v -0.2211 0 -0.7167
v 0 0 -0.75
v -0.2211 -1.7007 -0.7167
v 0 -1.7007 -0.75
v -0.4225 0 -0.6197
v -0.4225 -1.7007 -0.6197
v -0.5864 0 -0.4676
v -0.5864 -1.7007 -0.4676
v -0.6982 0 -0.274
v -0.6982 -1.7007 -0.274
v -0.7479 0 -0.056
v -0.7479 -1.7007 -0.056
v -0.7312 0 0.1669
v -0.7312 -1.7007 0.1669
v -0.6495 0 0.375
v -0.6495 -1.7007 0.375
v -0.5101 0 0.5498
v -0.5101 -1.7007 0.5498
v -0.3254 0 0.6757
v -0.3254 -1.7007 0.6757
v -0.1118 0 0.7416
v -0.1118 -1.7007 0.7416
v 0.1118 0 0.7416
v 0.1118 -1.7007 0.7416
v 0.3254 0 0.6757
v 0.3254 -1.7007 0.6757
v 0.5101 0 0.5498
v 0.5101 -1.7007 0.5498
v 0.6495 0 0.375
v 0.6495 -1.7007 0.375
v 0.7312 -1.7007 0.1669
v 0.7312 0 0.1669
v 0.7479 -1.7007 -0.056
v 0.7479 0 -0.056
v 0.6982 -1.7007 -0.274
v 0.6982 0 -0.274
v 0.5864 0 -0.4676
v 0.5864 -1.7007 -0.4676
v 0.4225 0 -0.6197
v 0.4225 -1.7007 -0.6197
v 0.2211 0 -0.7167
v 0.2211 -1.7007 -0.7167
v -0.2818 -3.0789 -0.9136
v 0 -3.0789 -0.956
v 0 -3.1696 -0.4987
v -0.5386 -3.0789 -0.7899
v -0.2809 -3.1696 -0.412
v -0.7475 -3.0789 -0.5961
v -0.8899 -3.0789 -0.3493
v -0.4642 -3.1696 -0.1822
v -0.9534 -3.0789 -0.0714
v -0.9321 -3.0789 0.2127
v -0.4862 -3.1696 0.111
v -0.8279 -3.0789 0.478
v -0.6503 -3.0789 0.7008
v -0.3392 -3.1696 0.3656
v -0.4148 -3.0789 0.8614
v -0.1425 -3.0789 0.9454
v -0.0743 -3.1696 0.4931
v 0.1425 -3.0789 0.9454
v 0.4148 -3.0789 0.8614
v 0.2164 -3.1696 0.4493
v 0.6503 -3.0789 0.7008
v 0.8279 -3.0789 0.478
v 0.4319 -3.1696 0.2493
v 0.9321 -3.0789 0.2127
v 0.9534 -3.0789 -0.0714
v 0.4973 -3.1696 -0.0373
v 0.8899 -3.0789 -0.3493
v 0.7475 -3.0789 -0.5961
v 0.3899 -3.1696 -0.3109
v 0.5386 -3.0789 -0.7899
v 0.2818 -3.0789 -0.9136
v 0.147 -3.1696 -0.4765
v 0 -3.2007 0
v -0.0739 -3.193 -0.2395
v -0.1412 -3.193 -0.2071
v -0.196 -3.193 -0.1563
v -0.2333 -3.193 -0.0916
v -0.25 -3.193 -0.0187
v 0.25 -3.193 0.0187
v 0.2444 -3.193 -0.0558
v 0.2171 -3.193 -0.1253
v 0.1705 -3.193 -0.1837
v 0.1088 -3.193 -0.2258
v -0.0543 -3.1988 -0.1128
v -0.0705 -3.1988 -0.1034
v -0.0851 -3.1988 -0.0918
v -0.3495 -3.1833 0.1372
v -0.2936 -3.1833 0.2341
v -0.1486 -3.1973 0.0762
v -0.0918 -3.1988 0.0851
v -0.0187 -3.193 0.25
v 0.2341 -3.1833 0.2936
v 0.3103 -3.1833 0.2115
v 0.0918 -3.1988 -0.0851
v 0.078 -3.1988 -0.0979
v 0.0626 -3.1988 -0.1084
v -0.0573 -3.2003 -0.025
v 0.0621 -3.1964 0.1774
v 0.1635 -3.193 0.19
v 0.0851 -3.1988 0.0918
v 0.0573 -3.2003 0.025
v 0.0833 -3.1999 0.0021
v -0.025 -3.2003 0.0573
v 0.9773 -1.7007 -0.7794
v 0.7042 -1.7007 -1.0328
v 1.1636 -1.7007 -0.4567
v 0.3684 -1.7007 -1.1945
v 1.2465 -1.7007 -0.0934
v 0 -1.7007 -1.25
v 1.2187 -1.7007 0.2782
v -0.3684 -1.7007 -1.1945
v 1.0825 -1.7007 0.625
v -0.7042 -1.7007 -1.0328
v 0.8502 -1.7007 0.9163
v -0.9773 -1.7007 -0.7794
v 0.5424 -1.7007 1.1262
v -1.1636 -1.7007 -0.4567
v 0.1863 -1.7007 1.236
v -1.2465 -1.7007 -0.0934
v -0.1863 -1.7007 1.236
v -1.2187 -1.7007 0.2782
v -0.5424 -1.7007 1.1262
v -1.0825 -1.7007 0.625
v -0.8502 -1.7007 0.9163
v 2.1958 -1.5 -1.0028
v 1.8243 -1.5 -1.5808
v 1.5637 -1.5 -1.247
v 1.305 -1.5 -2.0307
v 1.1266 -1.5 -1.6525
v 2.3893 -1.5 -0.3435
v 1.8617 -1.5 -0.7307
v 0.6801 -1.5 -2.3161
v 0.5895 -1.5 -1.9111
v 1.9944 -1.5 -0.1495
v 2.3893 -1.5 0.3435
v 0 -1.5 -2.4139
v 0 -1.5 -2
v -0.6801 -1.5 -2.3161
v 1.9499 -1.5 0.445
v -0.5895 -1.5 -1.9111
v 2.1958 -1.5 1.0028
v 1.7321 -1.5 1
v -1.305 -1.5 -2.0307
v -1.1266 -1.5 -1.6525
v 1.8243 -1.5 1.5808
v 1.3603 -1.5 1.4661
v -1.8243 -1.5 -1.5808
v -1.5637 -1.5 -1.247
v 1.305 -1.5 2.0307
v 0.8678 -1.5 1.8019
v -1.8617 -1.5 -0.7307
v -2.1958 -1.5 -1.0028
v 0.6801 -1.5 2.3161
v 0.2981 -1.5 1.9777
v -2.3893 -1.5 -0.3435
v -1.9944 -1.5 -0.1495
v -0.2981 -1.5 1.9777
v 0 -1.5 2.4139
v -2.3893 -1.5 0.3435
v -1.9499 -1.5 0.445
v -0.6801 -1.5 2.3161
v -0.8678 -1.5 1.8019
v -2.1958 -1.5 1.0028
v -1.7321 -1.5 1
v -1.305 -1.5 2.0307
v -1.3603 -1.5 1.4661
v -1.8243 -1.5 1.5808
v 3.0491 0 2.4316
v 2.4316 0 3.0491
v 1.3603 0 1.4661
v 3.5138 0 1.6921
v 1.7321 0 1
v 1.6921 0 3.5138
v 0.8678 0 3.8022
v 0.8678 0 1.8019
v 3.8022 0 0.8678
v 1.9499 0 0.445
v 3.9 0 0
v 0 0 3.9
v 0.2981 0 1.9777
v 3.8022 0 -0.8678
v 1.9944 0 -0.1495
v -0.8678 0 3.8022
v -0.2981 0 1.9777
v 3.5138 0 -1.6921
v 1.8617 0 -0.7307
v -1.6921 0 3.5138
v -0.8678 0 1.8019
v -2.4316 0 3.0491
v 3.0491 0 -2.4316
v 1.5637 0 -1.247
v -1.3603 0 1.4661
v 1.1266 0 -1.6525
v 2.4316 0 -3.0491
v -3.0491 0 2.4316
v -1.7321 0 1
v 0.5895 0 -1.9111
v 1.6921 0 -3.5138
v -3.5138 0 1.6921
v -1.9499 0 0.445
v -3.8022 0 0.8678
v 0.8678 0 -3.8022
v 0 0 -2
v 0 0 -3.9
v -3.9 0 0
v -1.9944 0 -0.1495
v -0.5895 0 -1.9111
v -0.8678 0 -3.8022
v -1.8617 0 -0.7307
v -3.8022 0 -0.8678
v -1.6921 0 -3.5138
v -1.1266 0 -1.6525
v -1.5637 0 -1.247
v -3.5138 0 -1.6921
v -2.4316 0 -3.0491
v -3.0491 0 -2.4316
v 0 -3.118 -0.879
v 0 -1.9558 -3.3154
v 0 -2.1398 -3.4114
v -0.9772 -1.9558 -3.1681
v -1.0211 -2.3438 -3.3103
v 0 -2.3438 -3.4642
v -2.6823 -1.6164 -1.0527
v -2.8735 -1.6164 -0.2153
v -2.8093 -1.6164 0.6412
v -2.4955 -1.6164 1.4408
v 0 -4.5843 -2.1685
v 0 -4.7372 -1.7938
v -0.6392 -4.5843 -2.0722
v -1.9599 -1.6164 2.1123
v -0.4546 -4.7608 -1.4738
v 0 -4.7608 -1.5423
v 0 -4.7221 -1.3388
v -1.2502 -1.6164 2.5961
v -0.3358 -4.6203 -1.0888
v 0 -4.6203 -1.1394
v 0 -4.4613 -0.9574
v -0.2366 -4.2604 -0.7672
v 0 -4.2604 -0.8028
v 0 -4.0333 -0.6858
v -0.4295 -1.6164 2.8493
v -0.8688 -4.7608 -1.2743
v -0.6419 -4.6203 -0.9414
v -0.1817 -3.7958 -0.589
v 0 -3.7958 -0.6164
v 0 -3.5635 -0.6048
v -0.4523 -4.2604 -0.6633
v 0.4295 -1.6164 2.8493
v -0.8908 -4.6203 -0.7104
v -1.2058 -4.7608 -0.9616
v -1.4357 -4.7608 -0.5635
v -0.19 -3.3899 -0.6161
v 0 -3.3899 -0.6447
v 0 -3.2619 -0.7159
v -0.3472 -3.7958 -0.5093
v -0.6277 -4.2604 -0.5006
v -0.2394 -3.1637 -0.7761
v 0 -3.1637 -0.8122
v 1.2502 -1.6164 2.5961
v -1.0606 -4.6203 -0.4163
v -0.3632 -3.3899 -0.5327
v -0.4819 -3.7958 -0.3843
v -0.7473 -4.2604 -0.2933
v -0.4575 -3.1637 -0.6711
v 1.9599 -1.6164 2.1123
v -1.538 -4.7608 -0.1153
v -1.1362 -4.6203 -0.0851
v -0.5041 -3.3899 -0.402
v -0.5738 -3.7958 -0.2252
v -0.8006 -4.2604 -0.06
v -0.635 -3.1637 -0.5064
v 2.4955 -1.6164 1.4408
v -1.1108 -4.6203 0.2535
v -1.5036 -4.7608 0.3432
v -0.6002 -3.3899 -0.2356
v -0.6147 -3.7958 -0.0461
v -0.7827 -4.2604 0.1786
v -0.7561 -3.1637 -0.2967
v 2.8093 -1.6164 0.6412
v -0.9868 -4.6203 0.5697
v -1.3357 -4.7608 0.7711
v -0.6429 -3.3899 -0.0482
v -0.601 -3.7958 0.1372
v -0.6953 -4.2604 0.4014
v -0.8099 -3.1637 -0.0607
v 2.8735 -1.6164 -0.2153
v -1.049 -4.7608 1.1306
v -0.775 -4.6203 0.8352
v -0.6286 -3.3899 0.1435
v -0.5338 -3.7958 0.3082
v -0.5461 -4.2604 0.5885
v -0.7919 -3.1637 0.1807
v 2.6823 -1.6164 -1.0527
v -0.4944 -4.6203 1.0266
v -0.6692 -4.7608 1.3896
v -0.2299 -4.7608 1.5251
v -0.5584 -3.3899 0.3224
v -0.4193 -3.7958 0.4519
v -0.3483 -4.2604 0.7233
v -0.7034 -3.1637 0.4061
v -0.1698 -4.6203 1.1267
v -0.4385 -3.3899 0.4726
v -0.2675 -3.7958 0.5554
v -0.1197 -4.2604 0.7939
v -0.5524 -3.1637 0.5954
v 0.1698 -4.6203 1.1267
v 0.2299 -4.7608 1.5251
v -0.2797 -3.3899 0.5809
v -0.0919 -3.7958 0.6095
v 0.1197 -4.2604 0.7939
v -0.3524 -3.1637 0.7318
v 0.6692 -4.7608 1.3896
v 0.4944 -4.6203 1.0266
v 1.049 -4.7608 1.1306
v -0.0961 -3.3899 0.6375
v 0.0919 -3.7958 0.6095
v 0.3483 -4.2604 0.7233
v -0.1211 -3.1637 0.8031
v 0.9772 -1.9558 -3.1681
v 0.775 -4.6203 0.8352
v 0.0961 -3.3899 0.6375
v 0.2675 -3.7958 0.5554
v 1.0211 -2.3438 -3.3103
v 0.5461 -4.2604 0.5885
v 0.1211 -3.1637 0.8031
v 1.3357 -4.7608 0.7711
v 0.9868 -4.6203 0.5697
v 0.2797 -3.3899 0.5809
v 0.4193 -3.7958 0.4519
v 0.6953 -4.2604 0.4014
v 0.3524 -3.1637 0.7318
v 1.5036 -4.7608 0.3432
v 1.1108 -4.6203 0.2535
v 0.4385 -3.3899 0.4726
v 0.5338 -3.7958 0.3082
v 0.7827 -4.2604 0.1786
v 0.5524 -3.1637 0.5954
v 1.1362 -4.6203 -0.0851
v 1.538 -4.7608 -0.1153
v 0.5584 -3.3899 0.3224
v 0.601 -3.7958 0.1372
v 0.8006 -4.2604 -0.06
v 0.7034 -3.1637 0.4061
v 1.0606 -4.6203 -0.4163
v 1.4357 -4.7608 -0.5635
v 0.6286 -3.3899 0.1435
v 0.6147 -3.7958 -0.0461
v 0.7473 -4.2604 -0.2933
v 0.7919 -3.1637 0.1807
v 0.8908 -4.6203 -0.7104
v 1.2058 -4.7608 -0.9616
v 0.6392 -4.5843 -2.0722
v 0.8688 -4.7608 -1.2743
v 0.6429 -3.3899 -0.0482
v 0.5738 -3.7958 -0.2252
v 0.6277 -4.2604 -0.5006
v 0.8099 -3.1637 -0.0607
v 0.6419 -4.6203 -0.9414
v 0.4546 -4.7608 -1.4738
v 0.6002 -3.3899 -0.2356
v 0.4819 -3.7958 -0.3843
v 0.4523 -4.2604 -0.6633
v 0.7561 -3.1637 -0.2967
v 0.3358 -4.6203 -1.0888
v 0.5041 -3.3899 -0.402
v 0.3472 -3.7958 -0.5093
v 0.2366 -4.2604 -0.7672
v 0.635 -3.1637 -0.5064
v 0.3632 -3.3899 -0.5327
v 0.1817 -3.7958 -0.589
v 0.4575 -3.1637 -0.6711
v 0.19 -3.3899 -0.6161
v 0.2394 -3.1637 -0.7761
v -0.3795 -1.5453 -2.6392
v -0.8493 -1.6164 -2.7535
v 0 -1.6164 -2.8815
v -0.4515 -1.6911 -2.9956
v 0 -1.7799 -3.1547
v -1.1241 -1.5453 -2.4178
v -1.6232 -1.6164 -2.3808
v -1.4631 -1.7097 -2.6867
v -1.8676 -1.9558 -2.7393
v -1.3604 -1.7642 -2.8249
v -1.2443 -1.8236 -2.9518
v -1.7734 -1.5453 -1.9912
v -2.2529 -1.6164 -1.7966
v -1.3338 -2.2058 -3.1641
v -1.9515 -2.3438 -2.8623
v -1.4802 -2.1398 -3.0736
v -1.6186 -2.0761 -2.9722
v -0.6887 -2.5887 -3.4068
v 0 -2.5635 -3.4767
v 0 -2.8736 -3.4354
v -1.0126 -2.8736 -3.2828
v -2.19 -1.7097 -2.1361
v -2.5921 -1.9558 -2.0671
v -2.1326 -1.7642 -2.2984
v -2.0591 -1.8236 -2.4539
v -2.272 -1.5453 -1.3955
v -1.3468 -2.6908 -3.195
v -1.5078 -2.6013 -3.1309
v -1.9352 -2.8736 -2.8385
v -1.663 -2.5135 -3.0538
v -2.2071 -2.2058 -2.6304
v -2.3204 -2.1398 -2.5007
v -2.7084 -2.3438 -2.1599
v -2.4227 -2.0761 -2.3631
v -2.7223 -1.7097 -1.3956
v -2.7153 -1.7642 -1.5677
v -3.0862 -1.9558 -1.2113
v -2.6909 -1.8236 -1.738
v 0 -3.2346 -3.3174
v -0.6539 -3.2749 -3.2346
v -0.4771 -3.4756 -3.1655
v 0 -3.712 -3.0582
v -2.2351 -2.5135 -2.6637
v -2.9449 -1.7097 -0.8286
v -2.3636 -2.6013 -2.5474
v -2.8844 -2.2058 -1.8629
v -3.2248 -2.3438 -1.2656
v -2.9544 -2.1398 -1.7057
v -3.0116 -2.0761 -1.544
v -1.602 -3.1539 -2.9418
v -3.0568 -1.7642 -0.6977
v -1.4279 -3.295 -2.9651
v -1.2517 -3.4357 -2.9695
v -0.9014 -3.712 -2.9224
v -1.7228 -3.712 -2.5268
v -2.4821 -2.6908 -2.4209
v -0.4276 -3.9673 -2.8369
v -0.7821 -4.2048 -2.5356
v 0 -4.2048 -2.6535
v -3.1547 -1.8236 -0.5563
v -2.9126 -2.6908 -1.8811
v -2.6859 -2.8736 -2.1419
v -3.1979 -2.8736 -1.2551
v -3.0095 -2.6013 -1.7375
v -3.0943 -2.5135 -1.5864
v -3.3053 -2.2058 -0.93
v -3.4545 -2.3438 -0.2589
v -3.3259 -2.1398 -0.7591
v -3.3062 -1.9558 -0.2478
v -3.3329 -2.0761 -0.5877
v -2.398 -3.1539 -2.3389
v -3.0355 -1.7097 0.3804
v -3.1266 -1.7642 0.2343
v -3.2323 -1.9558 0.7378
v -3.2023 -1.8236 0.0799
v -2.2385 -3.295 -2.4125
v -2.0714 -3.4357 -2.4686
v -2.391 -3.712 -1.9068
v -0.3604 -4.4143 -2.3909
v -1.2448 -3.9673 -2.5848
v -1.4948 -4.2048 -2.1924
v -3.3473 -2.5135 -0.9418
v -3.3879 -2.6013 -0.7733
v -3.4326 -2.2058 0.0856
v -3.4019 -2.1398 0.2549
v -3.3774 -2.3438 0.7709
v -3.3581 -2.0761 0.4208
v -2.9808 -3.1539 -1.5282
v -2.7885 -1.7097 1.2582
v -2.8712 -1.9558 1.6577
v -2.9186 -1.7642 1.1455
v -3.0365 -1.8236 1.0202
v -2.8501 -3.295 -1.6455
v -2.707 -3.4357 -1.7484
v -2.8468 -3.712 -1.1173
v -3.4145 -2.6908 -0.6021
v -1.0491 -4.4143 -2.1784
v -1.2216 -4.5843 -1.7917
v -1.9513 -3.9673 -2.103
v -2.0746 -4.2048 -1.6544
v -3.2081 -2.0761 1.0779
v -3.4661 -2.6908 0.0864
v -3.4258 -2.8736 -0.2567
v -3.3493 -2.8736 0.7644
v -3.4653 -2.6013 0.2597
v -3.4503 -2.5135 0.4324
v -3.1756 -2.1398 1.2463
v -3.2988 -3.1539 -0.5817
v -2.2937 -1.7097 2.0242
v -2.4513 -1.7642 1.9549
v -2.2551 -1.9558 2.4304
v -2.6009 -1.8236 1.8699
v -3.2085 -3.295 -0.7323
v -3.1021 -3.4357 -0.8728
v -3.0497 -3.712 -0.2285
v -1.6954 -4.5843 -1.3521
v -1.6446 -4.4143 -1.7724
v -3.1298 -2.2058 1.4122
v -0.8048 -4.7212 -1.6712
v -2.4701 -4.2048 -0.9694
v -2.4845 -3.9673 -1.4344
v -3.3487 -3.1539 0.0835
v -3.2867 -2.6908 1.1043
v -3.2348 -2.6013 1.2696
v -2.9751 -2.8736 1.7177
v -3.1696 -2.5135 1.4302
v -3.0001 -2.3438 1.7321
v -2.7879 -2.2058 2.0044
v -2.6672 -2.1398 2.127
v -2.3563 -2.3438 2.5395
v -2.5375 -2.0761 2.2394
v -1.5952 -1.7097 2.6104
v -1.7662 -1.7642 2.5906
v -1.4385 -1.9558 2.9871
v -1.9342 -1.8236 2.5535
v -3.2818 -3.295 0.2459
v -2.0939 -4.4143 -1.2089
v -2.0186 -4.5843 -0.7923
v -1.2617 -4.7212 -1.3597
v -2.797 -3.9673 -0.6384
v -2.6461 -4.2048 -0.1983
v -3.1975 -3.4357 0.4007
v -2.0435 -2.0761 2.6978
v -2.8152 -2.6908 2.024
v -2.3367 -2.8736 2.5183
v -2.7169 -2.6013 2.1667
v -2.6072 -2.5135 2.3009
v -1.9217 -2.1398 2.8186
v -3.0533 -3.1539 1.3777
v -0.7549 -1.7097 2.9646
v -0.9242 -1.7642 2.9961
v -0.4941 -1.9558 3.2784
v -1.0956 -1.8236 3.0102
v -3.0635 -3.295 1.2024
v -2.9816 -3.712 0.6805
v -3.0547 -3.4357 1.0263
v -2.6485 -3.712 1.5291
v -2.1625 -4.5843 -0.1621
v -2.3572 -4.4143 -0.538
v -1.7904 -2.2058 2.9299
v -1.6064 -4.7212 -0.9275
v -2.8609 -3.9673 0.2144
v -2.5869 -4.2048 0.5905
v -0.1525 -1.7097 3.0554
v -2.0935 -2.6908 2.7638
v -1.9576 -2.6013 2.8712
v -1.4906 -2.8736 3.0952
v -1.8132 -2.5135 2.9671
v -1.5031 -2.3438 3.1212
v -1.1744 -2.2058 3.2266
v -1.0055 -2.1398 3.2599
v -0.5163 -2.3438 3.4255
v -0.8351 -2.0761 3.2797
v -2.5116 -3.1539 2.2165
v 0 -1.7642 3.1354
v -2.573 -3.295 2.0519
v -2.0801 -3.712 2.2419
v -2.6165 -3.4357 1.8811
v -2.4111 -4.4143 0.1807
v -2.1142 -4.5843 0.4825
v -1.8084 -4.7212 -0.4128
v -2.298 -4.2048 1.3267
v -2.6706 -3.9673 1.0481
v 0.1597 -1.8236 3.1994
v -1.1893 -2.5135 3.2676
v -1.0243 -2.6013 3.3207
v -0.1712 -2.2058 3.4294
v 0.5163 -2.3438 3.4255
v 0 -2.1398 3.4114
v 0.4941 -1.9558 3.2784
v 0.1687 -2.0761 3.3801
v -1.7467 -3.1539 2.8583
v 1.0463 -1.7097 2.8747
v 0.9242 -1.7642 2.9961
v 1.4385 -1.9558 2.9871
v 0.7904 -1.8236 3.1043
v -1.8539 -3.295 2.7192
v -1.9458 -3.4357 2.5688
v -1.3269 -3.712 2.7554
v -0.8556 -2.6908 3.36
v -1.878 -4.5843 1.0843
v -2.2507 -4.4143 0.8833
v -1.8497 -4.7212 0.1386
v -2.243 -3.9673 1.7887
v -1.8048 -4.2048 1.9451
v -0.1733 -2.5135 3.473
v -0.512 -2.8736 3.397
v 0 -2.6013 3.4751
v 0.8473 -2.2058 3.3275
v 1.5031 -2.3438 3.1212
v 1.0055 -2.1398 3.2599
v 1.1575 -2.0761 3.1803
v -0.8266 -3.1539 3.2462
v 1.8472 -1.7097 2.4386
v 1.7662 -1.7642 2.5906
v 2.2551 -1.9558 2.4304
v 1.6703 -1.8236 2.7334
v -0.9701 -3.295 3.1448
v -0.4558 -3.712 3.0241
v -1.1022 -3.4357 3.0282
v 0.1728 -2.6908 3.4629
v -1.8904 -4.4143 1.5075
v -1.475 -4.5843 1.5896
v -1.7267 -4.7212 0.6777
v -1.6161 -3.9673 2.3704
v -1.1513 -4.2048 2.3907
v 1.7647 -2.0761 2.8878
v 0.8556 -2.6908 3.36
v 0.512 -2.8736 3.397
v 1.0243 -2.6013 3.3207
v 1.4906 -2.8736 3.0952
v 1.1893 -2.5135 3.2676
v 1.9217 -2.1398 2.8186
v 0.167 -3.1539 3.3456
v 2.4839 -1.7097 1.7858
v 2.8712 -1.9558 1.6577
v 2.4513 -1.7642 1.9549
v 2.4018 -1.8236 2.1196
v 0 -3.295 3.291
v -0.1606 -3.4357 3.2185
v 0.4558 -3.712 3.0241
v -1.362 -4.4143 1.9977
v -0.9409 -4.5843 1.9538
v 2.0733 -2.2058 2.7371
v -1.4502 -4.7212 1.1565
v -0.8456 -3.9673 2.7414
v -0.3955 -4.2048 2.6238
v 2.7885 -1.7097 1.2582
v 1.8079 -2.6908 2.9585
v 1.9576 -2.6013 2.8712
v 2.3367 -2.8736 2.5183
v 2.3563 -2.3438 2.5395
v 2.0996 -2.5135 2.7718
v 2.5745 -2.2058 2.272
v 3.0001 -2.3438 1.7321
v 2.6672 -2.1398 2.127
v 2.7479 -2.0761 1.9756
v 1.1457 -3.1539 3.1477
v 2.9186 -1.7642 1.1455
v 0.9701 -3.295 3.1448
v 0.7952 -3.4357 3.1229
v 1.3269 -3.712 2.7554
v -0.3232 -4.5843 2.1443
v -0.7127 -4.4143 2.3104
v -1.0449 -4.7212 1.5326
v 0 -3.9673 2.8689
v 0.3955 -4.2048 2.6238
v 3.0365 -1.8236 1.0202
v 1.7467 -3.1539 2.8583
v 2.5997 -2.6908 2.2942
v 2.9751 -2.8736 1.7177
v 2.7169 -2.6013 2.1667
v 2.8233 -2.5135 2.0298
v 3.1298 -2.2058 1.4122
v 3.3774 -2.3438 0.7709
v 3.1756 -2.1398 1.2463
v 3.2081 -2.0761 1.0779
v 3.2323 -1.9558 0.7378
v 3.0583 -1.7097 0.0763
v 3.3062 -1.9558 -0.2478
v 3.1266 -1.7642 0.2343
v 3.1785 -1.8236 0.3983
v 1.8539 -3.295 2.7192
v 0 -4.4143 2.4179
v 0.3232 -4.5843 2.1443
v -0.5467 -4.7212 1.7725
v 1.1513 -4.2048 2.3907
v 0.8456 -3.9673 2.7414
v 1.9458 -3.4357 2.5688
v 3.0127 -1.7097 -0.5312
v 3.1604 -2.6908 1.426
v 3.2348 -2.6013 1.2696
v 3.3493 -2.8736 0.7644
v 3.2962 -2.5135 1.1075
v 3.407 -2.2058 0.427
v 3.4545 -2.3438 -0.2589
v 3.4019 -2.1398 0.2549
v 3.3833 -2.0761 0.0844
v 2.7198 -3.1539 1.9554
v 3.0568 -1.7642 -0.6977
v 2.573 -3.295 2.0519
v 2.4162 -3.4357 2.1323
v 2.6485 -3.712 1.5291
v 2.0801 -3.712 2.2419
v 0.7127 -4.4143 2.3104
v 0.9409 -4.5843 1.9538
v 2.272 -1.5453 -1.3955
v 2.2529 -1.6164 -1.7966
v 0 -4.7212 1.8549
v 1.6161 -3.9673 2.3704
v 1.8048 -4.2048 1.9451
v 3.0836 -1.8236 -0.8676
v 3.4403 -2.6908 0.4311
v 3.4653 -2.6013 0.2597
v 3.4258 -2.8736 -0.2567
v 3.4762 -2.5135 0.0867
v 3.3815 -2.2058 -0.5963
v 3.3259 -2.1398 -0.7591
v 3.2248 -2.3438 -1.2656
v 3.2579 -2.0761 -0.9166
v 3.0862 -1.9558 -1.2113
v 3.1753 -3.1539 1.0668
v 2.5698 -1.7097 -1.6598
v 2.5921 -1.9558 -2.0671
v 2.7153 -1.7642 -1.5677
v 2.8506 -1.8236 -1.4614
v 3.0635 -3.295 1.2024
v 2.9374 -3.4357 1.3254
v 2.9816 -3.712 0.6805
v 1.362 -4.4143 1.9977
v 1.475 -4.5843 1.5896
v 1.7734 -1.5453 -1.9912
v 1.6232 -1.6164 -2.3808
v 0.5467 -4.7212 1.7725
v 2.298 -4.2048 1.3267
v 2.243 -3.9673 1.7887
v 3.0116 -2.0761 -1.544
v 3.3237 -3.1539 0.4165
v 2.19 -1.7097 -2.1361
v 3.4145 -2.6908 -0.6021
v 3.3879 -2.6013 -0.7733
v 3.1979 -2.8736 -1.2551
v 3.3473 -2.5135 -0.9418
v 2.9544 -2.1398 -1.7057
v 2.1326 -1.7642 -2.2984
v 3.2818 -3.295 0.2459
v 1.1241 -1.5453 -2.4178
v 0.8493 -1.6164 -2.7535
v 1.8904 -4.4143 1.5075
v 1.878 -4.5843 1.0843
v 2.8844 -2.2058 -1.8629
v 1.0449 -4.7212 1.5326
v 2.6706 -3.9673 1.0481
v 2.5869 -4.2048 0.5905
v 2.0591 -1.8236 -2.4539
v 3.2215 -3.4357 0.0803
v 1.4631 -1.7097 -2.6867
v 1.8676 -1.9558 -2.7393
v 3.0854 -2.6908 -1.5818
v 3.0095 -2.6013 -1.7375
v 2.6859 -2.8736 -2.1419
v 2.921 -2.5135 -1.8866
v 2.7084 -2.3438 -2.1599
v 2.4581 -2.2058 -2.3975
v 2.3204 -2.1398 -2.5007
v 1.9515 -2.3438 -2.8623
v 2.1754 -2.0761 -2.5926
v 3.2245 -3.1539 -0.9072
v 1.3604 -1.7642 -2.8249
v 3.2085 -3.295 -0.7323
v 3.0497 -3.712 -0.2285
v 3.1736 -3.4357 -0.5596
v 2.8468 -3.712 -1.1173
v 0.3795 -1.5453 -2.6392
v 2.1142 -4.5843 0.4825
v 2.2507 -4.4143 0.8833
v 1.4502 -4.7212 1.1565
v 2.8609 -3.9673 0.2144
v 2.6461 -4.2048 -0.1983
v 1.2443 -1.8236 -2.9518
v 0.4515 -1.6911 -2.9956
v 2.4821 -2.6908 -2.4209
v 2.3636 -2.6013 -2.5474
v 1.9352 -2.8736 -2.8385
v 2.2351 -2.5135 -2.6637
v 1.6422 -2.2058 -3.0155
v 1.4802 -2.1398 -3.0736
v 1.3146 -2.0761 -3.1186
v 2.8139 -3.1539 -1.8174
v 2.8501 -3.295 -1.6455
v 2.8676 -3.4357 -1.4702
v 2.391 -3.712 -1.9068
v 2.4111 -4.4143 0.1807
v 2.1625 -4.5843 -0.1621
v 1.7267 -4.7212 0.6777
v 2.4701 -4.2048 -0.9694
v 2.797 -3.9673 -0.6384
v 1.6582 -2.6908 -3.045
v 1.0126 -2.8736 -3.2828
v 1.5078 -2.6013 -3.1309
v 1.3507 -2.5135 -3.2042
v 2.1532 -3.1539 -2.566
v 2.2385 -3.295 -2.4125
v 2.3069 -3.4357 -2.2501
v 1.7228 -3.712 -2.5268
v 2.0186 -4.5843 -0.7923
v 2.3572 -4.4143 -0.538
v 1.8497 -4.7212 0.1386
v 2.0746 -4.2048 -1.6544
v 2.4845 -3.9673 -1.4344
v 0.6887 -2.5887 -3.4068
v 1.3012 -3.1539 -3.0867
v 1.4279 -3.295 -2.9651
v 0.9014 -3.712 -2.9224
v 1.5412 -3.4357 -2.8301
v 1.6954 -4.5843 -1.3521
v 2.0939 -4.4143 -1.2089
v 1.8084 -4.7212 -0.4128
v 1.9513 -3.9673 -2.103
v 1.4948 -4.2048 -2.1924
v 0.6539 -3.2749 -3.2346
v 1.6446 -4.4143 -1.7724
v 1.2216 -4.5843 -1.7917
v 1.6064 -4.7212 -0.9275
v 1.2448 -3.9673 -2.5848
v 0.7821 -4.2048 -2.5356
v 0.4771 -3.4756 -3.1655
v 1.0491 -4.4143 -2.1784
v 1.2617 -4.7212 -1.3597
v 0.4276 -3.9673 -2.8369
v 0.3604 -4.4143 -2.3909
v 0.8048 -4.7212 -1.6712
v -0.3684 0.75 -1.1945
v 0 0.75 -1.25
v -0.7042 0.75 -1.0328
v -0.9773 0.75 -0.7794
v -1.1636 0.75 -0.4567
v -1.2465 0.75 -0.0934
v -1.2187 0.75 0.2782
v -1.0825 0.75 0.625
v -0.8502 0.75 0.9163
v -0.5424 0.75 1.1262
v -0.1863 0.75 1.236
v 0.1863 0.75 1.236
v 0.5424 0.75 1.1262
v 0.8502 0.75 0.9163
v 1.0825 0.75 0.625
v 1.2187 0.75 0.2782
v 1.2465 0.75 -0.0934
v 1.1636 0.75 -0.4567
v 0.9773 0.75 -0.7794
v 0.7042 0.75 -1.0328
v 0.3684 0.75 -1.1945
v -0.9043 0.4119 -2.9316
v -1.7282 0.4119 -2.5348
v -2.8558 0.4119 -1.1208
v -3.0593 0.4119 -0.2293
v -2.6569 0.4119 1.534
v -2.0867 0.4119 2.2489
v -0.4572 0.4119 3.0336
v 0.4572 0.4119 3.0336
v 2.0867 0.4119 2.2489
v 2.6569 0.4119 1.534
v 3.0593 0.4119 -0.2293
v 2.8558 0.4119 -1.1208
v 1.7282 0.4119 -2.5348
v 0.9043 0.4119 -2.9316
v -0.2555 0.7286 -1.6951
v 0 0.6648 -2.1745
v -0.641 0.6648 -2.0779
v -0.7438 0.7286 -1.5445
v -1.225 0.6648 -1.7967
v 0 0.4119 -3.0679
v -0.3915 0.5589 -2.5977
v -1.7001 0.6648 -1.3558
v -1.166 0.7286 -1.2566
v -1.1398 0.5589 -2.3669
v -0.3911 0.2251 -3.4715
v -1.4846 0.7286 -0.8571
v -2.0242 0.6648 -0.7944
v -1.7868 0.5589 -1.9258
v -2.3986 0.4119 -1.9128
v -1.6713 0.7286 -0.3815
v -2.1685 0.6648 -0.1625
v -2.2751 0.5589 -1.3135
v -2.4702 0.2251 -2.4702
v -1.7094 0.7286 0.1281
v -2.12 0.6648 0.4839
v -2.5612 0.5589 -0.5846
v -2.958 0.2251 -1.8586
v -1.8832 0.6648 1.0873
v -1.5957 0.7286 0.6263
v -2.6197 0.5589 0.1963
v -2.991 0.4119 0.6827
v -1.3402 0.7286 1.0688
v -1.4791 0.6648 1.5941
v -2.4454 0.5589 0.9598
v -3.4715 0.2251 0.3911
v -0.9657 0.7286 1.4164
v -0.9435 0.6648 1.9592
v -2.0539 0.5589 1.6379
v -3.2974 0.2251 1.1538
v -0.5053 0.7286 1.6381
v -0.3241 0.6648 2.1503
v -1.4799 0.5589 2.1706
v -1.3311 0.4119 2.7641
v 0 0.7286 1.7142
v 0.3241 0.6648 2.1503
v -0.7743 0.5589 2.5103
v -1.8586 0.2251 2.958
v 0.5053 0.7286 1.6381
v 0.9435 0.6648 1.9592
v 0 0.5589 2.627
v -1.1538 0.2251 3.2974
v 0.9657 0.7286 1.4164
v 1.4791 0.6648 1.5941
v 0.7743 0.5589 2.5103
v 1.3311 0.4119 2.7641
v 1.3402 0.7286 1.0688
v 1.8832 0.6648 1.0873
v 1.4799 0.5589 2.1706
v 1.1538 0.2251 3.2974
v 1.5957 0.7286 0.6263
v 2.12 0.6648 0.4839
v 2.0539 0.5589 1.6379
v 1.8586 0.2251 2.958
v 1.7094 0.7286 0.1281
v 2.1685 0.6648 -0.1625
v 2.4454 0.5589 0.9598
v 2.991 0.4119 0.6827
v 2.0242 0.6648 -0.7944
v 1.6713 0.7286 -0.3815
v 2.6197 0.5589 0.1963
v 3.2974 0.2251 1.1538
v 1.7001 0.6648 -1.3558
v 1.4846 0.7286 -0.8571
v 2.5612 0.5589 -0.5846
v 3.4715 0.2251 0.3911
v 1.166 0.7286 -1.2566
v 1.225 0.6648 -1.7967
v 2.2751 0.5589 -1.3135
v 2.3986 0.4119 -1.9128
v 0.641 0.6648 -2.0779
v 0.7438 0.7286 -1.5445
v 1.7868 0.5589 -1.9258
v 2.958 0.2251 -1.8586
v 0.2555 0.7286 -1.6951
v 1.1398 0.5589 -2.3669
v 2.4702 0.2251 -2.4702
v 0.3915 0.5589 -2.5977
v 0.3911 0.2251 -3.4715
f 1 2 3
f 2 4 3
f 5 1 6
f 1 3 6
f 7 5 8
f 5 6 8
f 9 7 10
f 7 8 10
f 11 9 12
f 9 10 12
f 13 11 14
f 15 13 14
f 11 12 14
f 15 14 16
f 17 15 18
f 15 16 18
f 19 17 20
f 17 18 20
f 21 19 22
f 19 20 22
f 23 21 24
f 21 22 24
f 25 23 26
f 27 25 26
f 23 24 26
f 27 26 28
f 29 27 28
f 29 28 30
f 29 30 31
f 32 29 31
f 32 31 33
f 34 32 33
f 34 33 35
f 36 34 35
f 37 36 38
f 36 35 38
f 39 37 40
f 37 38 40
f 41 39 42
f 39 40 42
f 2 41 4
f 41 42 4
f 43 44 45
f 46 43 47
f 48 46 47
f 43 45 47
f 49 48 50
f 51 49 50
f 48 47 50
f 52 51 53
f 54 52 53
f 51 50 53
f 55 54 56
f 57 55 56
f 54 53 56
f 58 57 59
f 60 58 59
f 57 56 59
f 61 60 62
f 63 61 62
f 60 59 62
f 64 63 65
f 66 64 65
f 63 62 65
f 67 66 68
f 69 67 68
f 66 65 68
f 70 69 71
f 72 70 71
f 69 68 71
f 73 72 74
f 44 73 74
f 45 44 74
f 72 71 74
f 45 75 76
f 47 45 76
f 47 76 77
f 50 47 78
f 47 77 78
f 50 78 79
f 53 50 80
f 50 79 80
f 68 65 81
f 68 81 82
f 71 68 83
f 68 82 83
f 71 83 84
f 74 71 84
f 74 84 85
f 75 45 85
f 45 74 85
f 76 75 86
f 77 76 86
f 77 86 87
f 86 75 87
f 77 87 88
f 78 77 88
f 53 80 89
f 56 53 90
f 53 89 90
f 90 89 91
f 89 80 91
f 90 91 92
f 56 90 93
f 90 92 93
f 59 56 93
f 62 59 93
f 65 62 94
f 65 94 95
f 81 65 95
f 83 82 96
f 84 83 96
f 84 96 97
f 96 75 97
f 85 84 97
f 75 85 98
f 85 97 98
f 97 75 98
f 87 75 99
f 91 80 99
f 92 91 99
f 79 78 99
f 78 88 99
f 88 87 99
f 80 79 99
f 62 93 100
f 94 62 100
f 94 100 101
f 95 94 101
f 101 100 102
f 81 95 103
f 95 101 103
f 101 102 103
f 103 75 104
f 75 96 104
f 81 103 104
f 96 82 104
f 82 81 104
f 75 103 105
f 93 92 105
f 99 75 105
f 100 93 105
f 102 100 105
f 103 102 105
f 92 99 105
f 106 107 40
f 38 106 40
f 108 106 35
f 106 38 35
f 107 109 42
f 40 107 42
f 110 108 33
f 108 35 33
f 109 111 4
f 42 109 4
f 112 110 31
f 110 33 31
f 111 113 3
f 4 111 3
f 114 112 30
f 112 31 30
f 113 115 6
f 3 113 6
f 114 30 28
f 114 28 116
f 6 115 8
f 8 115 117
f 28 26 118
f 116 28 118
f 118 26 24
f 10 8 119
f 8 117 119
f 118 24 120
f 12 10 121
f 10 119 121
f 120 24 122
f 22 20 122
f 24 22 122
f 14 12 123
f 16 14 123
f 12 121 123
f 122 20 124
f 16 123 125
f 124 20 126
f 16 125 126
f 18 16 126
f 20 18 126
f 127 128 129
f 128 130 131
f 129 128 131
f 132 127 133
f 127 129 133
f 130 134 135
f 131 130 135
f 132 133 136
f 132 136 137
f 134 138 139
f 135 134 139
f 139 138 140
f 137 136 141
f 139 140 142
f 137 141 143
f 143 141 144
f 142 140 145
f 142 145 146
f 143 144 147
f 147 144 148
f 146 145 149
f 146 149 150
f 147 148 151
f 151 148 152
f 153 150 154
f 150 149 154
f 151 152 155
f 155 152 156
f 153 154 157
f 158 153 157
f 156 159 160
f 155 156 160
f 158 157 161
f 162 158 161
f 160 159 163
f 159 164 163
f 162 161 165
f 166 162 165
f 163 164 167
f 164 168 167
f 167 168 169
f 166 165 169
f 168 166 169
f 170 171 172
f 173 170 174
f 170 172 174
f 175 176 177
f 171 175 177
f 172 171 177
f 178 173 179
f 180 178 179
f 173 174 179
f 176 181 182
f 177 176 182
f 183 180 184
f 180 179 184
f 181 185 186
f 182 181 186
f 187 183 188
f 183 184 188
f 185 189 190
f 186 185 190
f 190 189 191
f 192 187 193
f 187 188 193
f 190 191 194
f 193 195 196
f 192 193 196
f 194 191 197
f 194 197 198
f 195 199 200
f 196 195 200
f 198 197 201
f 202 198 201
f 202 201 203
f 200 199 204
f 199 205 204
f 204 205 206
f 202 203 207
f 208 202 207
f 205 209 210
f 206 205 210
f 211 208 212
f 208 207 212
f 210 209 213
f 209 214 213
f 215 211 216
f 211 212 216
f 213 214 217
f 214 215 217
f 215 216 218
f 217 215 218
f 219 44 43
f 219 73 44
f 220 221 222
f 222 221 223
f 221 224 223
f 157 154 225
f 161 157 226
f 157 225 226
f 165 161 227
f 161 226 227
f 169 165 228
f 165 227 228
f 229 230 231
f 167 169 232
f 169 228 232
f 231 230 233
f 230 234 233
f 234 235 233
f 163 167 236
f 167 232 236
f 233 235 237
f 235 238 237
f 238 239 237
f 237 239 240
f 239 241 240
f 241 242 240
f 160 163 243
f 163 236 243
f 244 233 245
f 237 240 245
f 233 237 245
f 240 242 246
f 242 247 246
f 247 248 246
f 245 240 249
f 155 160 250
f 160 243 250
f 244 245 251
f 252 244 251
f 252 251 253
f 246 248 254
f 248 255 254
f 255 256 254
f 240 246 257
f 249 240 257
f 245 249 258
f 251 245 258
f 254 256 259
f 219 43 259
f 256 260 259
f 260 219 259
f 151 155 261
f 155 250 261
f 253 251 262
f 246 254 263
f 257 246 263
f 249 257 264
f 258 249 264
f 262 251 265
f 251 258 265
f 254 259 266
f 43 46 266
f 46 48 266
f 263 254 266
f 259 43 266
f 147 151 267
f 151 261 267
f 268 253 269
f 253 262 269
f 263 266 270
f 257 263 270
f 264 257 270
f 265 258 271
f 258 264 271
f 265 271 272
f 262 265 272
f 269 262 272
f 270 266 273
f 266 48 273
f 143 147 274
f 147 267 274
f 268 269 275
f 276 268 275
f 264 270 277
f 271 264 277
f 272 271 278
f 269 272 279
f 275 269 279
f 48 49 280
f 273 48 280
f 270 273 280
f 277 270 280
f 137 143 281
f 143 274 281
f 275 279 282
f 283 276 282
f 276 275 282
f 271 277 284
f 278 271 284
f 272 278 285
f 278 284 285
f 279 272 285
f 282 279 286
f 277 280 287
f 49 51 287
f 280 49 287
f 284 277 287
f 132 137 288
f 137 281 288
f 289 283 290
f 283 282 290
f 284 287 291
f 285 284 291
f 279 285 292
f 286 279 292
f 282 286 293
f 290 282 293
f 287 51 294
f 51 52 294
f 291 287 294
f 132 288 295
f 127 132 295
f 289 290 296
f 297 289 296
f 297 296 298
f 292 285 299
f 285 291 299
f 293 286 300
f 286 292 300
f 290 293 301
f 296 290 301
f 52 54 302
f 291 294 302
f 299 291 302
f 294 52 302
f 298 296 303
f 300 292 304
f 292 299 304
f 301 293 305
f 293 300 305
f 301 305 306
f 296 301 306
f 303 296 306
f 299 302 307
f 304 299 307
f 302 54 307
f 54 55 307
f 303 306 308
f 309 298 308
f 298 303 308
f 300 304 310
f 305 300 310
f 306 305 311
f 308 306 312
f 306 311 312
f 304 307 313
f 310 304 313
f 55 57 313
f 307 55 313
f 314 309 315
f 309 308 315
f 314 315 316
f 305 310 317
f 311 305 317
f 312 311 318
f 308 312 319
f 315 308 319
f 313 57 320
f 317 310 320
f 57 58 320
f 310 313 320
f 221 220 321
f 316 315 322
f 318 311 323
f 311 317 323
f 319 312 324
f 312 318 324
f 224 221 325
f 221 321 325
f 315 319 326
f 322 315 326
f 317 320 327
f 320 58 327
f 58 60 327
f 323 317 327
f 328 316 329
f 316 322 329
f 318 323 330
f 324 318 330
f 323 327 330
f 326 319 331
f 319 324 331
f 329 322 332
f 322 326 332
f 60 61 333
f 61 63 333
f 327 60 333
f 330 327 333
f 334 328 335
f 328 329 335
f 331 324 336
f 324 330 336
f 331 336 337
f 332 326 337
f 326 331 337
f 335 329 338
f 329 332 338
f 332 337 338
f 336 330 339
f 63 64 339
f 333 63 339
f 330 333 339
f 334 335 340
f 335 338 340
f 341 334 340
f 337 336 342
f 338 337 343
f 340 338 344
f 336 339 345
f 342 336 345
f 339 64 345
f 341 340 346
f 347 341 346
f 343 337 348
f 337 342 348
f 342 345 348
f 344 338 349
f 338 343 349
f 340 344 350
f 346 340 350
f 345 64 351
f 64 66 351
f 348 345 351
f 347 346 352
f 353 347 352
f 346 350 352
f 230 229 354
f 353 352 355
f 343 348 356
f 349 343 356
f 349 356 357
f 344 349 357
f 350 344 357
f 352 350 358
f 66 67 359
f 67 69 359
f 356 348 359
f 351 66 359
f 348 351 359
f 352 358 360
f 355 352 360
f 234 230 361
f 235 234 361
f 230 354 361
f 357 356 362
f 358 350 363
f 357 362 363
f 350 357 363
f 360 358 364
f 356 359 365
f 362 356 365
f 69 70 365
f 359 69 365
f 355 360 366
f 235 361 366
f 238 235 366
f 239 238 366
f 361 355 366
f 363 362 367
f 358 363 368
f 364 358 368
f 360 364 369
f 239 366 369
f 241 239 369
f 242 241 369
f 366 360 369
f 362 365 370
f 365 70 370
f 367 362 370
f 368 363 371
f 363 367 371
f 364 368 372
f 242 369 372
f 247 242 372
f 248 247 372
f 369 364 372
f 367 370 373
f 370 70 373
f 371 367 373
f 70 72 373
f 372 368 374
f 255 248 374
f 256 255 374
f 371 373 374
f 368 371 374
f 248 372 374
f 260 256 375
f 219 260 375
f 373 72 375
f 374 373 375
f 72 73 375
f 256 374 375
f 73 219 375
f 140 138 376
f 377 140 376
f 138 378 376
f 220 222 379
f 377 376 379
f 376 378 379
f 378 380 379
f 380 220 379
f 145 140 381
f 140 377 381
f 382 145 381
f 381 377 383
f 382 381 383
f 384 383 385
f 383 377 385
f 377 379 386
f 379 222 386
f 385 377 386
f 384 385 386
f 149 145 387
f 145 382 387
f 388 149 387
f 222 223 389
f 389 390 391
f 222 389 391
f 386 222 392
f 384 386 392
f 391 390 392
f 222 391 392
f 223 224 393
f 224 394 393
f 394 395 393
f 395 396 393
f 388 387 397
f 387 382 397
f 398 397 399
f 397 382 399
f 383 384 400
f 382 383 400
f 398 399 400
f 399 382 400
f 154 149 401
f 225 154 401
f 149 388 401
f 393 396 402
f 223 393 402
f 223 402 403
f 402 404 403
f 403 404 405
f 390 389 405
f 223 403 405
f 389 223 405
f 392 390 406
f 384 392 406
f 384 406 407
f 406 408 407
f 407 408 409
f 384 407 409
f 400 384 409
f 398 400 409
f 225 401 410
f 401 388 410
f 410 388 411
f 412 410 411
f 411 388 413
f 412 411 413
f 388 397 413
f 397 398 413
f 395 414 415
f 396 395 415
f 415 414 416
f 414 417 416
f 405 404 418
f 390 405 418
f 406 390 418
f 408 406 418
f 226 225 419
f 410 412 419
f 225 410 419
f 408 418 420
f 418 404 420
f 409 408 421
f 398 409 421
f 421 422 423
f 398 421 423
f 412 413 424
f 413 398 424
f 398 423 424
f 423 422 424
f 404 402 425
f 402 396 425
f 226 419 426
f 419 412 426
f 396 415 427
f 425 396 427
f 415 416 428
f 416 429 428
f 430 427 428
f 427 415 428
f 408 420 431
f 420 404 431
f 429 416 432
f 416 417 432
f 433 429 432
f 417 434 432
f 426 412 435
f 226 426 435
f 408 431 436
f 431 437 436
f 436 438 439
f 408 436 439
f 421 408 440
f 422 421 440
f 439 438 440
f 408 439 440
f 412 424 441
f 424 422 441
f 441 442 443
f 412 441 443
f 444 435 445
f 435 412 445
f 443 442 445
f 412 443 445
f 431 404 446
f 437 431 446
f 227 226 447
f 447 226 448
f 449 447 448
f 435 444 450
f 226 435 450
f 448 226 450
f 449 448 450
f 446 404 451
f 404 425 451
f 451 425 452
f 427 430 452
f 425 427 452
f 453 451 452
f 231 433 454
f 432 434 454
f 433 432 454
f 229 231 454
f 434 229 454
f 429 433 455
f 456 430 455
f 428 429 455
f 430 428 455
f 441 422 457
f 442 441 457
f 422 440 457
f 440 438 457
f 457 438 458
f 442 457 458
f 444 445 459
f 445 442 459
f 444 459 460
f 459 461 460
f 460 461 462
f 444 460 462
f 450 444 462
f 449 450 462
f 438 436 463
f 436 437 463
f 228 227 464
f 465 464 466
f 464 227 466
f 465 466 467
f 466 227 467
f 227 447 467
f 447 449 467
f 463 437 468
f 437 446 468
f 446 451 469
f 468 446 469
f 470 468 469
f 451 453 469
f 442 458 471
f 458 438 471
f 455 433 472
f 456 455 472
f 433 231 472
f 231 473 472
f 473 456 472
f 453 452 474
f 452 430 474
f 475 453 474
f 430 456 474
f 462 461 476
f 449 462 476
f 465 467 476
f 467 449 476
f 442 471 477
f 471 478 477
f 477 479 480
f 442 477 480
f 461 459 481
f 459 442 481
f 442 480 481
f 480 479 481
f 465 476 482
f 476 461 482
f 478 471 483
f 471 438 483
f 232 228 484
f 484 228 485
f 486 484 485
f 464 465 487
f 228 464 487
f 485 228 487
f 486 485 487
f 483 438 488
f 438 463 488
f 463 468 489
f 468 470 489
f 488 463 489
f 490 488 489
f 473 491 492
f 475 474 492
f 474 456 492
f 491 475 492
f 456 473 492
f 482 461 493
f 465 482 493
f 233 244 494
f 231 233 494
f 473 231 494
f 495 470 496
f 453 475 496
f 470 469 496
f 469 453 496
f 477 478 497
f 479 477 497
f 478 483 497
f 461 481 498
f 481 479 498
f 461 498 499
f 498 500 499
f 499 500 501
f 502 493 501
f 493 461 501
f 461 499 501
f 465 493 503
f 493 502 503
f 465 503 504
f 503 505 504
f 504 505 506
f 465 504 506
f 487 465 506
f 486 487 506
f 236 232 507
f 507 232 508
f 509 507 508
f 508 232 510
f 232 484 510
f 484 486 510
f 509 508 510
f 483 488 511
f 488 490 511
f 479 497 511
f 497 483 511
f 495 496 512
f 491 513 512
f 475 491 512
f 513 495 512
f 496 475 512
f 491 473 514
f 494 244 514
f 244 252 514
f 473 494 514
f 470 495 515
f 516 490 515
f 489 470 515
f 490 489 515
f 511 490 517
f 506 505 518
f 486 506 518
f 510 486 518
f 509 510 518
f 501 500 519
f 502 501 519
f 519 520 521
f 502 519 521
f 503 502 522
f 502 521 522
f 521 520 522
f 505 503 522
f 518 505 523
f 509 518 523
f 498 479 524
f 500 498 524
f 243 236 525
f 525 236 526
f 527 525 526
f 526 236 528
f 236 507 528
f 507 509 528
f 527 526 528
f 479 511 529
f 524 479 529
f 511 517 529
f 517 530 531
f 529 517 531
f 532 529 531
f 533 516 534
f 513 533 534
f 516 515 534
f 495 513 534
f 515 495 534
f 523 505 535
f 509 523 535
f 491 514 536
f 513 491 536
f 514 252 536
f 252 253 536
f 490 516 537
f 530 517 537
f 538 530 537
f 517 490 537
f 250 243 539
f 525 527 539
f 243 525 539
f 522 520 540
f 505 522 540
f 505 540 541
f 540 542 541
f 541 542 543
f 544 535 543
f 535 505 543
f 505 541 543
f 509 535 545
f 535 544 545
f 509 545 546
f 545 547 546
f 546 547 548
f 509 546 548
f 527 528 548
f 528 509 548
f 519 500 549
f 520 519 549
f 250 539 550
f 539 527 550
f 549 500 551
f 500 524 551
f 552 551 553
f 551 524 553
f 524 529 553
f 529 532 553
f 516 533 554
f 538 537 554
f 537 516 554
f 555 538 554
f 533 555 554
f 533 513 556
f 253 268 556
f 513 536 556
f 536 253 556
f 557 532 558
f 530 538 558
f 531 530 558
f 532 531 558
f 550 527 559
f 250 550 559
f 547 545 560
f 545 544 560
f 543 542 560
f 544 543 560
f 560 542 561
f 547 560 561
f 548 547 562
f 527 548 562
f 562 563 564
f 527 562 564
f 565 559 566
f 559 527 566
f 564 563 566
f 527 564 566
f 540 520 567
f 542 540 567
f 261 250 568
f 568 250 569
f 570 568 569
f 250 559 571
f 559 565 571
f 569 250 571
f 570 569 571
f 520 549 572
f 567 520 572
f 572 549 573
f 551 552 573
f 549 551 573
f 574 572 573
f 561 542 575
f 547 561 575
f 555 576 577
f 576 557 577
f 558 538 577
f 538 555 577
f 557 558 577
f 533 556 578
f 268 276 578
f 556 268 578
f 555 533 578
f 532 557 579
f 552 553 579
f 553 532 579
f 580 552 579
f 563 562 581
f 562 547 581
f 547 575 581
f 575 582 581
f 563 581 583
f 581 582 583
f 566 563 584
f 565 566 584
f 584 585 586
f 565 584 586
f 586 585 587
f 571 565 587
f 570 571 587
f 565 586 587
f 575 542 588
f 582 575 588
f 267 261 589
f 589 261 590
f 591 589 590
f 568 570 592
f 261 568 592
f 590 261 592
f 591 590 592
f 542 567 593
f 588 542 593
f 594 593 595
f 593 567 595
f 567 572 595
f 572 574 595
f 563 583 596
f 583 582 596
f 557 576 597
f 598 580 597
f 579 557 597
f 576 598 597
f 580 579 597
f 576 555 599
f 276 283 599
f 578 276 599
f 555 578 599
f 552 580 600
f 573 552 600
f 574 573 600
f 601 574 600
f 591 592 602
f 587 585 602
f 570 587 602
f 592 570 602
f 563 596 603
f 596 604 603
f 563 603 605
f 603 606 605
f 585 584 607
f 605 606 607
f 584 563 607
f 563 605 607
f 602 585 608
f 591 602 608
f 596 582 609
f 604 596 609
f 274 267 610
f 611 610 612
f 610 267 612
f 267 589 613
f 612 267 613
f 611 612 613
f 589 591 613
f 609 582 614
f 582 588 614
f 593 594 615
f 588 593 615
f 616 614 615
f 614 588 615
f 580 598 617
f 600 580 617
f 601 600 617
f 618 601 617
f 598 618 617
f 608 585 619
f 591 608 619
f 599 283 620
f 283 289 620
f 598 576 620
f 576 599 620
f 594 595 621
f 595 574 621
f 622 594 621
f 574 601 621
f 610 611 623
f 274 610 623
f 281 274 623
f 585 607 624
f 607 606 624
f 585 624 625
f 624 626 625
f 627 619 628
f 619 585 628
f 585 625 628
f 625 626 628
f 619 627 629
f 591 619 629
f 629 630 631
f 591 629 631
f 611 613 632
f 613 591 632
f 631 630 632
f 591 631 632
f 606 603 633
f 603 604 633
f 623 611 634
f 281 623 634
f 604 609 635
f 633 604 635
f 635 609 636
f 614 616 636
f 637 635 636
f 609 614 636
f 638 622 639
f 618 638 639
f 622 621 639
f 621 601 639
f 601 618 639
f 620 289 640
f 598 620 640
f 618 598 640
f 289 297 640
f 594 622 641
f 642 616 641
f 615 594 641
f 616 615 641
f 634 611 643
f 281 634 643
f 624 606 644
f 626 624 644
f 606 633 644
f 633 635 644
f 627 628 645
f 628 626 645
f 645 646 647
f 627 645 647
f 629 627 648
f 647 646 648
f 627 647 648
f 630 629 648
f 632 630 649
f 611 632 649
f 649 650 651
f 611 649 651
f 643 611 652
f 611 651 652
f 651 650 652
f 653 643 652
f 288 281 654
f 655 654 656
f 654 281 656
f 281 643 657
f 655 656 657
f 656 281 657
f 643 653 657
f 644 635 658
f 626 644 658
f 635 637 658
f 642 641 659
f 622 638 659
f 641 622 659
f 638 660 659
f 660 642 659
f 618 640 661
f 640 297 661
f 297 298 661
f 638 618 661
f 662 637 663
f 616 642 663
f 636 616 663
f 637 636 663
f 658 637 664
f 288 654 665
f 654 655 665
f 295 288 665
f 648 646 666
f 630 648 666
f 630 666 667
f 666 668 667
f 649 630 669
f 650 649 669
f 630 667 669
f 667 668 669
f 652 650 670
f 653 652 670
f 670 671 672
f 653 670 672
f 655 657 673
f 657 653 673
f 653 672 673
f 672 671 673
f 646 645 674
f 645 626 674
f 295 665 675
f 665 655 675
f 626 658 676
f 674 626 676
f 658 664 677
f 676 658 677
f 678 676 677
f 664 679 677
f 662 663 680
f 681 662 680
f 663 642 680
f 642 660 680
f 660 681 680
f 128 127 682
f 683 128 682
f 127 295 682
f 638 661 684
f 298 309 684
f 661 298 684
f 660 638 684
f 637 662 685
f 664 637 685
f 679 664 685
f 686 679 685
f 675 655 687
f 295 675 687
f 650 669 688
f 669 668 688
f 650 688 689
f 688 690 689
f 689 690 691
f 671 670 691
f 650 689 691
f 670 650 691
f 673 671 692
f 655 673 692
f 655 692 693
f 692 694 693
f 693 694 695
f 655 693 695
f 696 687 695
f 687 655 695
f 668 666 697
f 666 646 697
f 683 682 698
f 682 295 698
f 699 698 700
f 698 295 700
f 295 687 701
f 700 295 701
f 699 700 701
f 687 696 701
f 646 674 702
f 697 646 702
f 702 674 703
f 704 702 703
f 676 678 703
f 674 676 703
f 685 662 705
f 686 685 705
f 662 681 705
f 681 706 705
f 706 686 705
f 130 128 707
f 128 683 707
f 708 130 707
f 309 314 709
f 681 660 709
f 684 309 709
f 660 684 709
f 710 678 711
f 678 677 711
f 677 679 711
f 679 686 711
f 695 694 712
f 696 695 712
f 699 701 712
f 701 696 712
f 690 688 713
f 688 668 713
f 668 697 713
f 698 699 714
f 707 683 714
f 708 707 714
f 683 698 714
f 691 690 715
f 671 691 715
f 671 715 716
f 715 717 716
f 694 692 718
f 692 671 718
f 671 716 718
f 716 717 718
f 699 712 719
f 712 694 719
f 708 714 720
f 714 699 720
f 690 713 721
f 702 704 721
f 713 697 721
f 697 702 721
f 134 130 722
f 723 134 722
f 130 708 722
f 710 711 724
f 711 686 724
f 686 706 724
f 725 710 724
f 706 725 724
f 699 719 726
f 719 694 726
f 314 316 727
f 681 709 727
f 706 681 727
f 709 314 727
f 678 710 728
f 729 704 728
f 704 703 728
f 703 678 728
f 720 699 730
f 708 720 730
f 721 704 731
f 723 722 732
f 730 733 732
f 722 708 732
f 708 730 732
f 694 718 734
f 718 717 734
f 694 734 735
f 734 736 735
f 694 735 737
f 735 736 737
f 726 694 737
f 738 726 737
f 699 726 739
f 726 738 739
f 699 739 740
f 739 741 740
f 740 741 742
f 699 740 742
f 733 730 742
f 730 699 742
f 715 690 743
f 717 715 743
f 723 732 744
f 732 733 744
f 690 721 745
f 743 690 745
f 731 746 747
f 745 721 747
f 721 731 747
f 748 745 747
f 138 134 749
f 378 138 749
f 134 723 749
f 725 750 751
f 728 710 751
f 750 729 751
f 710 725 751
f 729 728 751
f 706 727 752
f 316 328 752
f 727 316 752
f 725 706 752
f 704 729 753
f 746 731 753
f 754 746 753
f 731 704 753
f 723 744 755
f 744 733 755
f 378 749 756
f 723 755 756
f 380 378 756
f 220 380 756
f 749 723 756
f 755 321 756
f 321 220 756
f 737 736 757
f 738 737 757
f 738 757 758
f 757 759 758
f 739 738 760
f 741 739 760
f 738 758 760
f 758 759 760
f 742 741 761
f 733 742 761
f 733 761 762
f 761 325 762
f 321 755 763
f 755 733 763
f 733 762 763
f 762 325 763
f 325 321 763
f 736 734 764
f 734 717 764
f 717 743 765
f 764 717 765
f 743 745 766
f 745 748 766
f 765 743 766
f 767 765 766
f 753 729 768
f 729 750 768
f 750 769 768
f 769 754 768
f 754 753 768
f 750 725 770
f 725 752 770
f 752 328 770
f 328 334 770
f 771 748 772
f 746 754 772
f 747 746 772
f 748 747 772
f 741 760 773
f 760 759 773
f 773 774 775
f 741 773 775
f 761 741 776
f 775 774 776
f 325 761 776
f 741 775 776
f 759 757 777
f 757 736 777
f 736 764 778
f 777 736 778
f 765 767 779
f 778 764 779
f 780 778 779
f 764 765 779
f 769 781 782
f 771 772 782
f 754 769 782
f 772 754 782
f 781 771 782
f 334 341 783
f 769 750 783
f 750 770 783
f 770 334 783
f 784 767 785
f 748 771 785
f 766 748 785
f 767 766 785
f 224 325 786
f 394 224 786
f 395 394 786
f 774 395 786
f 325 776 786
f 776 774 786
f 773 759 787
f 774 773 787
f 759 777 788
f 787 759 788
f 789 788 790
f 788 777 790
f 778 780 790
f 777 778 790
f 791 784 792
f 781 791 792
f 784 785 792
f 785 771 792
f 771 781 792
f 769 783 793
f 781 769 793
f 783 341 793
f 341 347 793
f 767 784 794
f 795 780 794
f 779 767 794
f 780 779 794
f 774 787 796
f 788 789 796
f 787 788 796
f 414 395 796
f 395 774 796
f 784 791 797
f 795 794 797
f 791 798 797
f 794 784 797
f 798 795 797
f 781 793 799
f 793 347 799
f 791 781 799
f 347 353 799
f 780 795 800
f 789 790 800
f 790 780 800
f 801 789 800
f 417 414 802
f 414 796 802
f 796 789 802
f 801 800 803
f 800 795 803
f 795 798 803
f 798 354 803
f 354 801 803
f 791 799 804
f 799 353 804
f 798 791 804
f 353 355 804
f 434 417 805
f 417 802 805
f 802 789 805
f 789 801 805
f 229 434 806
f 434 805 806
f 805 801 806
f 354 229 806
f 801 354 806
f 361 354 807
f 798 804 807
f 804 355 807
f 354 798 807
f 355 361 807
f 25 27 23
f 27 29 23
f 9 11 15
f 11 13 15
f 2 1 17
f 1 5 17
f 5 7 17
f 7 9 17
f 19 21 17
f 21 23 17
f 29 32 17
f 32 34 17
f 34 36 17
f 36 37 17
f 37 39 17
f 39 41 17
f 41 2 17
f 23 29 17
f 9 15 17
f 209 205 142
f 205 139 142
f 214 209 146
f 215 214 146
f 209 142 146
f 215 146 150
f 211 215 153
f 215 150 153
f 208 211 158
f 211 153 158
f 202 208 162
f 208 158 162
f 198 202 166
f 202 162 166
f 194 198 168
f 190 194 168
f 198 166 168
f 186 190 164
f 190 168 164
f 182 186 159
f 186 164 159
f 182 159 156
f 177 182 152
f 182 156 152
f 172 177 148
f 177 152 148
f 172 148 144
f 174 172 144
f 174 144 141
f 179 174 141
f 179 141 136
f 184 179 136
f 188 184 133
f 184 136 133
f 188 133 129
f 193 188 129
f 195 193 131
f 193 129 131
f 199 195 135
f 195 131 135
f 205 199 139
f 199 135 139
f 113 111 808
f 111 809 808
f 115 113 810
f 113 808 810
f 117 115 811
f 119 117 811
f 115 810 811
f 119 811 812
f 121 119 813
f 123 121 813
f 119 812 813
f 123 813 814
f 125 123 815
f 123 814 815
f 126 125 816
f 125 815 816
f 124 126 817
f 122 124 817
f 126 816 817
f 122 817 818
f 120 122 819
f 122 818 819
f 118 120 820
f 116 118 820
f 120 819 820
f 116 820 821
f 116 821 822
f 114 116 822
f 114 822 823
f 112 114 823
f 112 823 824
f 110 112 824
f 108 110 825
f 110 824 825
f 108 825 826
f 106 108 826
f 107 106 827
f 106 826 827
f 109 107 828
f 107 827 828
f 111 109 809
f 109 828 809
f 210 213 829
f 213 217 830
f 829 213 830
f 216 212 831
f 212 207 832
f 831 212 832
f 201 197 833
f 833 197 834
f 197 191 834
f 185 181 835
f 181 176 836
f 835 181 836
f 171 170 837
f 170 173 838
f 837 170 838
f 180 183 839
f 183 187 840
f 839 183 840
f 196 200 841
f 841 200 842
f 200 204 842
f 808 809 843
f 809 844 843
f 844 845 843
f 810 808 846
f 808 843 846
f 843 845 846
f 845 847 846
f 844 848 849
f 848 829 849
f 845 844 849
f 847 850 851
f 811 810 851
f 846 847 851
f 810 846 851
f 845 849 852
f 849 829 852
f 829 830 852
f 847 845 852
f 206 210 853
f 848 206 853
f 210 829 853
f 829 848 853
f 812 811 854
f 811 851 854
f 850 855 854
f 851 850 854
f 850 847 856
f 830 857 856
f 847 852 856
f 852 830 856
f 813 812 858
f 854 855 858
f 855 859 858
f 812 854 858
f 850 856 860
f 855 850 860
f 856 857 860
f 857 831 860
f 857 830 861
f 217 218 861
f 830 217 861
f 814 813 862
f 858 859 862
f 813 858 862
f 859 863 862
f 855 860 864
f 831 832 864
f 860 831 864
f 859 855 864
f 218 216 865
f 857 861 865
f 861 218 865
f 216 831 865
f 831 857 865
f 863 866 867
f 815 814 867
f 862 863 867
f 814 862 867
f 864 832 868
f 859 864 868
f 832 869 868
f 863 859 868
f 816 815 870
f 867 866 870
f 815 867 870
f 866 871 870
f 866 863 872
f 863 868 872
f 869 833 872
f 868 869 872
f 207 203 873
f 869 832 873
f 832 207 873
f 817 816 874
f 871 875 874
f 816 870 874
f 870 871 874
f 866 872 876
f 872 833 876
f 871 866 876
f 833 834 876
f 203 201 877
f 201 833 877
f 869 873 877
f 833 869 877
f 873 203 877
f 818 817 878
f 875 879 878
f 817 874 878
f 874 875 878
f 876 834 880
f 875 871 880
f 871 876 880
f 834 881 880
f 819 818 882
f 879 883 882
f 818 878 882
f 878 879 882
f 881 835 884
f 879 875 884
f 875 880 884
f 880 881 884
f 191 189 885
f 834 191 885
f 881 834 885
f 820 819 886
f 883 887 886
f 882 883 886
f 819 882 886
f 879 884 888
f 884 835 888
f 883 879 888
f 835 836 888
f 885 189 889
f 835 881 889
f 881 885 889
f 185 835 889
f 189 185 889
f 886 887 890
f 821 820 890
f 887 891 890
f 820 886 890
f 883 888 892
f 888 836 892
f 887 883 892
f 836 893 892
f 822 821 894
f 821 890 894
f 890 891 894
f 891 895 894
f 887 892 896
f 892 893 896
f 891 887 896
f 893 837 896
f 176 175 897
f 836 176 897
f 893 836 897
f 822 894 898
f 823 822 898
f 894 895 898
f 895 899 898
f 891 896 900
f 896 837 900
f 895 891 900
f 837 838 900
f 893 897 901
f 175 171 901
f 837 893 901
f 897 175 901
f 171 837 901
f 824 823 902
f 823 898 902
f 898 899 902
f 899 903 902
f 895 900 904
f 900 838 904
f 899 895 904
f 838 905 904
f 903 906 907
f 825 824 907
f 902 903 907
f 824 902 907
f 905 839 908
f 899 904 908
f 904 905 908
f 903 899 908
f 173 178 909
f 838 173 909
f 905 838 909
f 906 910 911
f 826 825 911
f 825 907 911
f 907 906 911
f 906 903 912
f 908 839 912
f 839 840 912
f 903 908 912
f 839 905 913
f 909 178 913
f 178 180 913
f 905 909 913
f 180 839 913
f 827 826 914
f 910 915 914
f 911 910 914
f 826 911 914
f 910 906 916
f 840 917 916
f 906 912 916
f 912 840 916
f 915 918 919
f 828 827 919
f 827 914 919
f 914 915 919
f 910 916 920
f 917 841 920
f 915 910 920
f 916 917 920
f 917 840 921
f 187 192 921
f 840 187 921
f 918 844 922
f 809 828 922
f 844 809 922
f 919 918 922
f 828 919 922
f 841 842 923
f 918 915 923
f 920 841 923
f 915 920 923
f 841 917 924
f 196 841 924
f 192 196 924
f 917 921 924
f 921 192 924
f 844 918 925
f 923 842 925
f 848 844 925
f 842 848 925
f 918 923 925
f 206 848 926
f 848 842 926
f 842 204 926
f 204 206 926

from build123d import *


with BuildPart() as part:
    # Szkic1 → Obrót1 (revolve)
    with BuildSketch(Plane(origin=(0, 0, 0), x_dir=(0, 0, -1), z_dir=(1, 0, 0)), mode=Mode.PRIVATE) as obr_t1_sk:
        with BuildLine():
            Line((0, 0), (-0.75, 0))
            Line((-0.75, 0), (-0.75, -1.700738523))
            Line((-0.75, -1.700738523), (-1.25, -1.700738523))
            Line((-1.25, -1.700738523), (-1.25, 0.75))
            ThreePointArc((-1.25, 0.75), (-2.627043935, 0.558888572), (-3.9, 0))
            Line((-3.9, 0), (-2, 0))
            Line((-2, 0), (-2, -1.5))
            Line((-2, -1.5), (-2.413891755, -1.5))
            add(Edge.make_bspline(
                [(-2.413891755, -1.5), (-3.867503112, -1.669657322), (-3.528877649, -3.802013626), (-1.083961642, -5.373532369), (-0.271752618, -3.374949298), (-0.956030427, -3.078929194)],
                knots=[0, 0, 0, 0, 0.464993082, 0.721927553, 1, 1, 1, 1], degree=3))
            add(Edge.make_bspline(
                [(-0.956030427, -3.078929194), (-0.520263876, -3.200738523), (0, -3.200738523)],
                knots=[0.992852221, 0.992852221, 0.992852221, 1.570796327, 1.570796327, 1.570796327], degree=2, weights=[1, 0.958537313, 1]))
            Line((0, -3.200738523), (0, -1.700738523))
            Line((0, -1.700738523), (0, 0))
        make_face()
    revolve(obr_t1_sk.sketch.rotate(Axis((0, 0, 0), (0, 1, 0)), 180), axis=Axis((0, 0, 0), (0, 1, 0)))


solid = part.part
